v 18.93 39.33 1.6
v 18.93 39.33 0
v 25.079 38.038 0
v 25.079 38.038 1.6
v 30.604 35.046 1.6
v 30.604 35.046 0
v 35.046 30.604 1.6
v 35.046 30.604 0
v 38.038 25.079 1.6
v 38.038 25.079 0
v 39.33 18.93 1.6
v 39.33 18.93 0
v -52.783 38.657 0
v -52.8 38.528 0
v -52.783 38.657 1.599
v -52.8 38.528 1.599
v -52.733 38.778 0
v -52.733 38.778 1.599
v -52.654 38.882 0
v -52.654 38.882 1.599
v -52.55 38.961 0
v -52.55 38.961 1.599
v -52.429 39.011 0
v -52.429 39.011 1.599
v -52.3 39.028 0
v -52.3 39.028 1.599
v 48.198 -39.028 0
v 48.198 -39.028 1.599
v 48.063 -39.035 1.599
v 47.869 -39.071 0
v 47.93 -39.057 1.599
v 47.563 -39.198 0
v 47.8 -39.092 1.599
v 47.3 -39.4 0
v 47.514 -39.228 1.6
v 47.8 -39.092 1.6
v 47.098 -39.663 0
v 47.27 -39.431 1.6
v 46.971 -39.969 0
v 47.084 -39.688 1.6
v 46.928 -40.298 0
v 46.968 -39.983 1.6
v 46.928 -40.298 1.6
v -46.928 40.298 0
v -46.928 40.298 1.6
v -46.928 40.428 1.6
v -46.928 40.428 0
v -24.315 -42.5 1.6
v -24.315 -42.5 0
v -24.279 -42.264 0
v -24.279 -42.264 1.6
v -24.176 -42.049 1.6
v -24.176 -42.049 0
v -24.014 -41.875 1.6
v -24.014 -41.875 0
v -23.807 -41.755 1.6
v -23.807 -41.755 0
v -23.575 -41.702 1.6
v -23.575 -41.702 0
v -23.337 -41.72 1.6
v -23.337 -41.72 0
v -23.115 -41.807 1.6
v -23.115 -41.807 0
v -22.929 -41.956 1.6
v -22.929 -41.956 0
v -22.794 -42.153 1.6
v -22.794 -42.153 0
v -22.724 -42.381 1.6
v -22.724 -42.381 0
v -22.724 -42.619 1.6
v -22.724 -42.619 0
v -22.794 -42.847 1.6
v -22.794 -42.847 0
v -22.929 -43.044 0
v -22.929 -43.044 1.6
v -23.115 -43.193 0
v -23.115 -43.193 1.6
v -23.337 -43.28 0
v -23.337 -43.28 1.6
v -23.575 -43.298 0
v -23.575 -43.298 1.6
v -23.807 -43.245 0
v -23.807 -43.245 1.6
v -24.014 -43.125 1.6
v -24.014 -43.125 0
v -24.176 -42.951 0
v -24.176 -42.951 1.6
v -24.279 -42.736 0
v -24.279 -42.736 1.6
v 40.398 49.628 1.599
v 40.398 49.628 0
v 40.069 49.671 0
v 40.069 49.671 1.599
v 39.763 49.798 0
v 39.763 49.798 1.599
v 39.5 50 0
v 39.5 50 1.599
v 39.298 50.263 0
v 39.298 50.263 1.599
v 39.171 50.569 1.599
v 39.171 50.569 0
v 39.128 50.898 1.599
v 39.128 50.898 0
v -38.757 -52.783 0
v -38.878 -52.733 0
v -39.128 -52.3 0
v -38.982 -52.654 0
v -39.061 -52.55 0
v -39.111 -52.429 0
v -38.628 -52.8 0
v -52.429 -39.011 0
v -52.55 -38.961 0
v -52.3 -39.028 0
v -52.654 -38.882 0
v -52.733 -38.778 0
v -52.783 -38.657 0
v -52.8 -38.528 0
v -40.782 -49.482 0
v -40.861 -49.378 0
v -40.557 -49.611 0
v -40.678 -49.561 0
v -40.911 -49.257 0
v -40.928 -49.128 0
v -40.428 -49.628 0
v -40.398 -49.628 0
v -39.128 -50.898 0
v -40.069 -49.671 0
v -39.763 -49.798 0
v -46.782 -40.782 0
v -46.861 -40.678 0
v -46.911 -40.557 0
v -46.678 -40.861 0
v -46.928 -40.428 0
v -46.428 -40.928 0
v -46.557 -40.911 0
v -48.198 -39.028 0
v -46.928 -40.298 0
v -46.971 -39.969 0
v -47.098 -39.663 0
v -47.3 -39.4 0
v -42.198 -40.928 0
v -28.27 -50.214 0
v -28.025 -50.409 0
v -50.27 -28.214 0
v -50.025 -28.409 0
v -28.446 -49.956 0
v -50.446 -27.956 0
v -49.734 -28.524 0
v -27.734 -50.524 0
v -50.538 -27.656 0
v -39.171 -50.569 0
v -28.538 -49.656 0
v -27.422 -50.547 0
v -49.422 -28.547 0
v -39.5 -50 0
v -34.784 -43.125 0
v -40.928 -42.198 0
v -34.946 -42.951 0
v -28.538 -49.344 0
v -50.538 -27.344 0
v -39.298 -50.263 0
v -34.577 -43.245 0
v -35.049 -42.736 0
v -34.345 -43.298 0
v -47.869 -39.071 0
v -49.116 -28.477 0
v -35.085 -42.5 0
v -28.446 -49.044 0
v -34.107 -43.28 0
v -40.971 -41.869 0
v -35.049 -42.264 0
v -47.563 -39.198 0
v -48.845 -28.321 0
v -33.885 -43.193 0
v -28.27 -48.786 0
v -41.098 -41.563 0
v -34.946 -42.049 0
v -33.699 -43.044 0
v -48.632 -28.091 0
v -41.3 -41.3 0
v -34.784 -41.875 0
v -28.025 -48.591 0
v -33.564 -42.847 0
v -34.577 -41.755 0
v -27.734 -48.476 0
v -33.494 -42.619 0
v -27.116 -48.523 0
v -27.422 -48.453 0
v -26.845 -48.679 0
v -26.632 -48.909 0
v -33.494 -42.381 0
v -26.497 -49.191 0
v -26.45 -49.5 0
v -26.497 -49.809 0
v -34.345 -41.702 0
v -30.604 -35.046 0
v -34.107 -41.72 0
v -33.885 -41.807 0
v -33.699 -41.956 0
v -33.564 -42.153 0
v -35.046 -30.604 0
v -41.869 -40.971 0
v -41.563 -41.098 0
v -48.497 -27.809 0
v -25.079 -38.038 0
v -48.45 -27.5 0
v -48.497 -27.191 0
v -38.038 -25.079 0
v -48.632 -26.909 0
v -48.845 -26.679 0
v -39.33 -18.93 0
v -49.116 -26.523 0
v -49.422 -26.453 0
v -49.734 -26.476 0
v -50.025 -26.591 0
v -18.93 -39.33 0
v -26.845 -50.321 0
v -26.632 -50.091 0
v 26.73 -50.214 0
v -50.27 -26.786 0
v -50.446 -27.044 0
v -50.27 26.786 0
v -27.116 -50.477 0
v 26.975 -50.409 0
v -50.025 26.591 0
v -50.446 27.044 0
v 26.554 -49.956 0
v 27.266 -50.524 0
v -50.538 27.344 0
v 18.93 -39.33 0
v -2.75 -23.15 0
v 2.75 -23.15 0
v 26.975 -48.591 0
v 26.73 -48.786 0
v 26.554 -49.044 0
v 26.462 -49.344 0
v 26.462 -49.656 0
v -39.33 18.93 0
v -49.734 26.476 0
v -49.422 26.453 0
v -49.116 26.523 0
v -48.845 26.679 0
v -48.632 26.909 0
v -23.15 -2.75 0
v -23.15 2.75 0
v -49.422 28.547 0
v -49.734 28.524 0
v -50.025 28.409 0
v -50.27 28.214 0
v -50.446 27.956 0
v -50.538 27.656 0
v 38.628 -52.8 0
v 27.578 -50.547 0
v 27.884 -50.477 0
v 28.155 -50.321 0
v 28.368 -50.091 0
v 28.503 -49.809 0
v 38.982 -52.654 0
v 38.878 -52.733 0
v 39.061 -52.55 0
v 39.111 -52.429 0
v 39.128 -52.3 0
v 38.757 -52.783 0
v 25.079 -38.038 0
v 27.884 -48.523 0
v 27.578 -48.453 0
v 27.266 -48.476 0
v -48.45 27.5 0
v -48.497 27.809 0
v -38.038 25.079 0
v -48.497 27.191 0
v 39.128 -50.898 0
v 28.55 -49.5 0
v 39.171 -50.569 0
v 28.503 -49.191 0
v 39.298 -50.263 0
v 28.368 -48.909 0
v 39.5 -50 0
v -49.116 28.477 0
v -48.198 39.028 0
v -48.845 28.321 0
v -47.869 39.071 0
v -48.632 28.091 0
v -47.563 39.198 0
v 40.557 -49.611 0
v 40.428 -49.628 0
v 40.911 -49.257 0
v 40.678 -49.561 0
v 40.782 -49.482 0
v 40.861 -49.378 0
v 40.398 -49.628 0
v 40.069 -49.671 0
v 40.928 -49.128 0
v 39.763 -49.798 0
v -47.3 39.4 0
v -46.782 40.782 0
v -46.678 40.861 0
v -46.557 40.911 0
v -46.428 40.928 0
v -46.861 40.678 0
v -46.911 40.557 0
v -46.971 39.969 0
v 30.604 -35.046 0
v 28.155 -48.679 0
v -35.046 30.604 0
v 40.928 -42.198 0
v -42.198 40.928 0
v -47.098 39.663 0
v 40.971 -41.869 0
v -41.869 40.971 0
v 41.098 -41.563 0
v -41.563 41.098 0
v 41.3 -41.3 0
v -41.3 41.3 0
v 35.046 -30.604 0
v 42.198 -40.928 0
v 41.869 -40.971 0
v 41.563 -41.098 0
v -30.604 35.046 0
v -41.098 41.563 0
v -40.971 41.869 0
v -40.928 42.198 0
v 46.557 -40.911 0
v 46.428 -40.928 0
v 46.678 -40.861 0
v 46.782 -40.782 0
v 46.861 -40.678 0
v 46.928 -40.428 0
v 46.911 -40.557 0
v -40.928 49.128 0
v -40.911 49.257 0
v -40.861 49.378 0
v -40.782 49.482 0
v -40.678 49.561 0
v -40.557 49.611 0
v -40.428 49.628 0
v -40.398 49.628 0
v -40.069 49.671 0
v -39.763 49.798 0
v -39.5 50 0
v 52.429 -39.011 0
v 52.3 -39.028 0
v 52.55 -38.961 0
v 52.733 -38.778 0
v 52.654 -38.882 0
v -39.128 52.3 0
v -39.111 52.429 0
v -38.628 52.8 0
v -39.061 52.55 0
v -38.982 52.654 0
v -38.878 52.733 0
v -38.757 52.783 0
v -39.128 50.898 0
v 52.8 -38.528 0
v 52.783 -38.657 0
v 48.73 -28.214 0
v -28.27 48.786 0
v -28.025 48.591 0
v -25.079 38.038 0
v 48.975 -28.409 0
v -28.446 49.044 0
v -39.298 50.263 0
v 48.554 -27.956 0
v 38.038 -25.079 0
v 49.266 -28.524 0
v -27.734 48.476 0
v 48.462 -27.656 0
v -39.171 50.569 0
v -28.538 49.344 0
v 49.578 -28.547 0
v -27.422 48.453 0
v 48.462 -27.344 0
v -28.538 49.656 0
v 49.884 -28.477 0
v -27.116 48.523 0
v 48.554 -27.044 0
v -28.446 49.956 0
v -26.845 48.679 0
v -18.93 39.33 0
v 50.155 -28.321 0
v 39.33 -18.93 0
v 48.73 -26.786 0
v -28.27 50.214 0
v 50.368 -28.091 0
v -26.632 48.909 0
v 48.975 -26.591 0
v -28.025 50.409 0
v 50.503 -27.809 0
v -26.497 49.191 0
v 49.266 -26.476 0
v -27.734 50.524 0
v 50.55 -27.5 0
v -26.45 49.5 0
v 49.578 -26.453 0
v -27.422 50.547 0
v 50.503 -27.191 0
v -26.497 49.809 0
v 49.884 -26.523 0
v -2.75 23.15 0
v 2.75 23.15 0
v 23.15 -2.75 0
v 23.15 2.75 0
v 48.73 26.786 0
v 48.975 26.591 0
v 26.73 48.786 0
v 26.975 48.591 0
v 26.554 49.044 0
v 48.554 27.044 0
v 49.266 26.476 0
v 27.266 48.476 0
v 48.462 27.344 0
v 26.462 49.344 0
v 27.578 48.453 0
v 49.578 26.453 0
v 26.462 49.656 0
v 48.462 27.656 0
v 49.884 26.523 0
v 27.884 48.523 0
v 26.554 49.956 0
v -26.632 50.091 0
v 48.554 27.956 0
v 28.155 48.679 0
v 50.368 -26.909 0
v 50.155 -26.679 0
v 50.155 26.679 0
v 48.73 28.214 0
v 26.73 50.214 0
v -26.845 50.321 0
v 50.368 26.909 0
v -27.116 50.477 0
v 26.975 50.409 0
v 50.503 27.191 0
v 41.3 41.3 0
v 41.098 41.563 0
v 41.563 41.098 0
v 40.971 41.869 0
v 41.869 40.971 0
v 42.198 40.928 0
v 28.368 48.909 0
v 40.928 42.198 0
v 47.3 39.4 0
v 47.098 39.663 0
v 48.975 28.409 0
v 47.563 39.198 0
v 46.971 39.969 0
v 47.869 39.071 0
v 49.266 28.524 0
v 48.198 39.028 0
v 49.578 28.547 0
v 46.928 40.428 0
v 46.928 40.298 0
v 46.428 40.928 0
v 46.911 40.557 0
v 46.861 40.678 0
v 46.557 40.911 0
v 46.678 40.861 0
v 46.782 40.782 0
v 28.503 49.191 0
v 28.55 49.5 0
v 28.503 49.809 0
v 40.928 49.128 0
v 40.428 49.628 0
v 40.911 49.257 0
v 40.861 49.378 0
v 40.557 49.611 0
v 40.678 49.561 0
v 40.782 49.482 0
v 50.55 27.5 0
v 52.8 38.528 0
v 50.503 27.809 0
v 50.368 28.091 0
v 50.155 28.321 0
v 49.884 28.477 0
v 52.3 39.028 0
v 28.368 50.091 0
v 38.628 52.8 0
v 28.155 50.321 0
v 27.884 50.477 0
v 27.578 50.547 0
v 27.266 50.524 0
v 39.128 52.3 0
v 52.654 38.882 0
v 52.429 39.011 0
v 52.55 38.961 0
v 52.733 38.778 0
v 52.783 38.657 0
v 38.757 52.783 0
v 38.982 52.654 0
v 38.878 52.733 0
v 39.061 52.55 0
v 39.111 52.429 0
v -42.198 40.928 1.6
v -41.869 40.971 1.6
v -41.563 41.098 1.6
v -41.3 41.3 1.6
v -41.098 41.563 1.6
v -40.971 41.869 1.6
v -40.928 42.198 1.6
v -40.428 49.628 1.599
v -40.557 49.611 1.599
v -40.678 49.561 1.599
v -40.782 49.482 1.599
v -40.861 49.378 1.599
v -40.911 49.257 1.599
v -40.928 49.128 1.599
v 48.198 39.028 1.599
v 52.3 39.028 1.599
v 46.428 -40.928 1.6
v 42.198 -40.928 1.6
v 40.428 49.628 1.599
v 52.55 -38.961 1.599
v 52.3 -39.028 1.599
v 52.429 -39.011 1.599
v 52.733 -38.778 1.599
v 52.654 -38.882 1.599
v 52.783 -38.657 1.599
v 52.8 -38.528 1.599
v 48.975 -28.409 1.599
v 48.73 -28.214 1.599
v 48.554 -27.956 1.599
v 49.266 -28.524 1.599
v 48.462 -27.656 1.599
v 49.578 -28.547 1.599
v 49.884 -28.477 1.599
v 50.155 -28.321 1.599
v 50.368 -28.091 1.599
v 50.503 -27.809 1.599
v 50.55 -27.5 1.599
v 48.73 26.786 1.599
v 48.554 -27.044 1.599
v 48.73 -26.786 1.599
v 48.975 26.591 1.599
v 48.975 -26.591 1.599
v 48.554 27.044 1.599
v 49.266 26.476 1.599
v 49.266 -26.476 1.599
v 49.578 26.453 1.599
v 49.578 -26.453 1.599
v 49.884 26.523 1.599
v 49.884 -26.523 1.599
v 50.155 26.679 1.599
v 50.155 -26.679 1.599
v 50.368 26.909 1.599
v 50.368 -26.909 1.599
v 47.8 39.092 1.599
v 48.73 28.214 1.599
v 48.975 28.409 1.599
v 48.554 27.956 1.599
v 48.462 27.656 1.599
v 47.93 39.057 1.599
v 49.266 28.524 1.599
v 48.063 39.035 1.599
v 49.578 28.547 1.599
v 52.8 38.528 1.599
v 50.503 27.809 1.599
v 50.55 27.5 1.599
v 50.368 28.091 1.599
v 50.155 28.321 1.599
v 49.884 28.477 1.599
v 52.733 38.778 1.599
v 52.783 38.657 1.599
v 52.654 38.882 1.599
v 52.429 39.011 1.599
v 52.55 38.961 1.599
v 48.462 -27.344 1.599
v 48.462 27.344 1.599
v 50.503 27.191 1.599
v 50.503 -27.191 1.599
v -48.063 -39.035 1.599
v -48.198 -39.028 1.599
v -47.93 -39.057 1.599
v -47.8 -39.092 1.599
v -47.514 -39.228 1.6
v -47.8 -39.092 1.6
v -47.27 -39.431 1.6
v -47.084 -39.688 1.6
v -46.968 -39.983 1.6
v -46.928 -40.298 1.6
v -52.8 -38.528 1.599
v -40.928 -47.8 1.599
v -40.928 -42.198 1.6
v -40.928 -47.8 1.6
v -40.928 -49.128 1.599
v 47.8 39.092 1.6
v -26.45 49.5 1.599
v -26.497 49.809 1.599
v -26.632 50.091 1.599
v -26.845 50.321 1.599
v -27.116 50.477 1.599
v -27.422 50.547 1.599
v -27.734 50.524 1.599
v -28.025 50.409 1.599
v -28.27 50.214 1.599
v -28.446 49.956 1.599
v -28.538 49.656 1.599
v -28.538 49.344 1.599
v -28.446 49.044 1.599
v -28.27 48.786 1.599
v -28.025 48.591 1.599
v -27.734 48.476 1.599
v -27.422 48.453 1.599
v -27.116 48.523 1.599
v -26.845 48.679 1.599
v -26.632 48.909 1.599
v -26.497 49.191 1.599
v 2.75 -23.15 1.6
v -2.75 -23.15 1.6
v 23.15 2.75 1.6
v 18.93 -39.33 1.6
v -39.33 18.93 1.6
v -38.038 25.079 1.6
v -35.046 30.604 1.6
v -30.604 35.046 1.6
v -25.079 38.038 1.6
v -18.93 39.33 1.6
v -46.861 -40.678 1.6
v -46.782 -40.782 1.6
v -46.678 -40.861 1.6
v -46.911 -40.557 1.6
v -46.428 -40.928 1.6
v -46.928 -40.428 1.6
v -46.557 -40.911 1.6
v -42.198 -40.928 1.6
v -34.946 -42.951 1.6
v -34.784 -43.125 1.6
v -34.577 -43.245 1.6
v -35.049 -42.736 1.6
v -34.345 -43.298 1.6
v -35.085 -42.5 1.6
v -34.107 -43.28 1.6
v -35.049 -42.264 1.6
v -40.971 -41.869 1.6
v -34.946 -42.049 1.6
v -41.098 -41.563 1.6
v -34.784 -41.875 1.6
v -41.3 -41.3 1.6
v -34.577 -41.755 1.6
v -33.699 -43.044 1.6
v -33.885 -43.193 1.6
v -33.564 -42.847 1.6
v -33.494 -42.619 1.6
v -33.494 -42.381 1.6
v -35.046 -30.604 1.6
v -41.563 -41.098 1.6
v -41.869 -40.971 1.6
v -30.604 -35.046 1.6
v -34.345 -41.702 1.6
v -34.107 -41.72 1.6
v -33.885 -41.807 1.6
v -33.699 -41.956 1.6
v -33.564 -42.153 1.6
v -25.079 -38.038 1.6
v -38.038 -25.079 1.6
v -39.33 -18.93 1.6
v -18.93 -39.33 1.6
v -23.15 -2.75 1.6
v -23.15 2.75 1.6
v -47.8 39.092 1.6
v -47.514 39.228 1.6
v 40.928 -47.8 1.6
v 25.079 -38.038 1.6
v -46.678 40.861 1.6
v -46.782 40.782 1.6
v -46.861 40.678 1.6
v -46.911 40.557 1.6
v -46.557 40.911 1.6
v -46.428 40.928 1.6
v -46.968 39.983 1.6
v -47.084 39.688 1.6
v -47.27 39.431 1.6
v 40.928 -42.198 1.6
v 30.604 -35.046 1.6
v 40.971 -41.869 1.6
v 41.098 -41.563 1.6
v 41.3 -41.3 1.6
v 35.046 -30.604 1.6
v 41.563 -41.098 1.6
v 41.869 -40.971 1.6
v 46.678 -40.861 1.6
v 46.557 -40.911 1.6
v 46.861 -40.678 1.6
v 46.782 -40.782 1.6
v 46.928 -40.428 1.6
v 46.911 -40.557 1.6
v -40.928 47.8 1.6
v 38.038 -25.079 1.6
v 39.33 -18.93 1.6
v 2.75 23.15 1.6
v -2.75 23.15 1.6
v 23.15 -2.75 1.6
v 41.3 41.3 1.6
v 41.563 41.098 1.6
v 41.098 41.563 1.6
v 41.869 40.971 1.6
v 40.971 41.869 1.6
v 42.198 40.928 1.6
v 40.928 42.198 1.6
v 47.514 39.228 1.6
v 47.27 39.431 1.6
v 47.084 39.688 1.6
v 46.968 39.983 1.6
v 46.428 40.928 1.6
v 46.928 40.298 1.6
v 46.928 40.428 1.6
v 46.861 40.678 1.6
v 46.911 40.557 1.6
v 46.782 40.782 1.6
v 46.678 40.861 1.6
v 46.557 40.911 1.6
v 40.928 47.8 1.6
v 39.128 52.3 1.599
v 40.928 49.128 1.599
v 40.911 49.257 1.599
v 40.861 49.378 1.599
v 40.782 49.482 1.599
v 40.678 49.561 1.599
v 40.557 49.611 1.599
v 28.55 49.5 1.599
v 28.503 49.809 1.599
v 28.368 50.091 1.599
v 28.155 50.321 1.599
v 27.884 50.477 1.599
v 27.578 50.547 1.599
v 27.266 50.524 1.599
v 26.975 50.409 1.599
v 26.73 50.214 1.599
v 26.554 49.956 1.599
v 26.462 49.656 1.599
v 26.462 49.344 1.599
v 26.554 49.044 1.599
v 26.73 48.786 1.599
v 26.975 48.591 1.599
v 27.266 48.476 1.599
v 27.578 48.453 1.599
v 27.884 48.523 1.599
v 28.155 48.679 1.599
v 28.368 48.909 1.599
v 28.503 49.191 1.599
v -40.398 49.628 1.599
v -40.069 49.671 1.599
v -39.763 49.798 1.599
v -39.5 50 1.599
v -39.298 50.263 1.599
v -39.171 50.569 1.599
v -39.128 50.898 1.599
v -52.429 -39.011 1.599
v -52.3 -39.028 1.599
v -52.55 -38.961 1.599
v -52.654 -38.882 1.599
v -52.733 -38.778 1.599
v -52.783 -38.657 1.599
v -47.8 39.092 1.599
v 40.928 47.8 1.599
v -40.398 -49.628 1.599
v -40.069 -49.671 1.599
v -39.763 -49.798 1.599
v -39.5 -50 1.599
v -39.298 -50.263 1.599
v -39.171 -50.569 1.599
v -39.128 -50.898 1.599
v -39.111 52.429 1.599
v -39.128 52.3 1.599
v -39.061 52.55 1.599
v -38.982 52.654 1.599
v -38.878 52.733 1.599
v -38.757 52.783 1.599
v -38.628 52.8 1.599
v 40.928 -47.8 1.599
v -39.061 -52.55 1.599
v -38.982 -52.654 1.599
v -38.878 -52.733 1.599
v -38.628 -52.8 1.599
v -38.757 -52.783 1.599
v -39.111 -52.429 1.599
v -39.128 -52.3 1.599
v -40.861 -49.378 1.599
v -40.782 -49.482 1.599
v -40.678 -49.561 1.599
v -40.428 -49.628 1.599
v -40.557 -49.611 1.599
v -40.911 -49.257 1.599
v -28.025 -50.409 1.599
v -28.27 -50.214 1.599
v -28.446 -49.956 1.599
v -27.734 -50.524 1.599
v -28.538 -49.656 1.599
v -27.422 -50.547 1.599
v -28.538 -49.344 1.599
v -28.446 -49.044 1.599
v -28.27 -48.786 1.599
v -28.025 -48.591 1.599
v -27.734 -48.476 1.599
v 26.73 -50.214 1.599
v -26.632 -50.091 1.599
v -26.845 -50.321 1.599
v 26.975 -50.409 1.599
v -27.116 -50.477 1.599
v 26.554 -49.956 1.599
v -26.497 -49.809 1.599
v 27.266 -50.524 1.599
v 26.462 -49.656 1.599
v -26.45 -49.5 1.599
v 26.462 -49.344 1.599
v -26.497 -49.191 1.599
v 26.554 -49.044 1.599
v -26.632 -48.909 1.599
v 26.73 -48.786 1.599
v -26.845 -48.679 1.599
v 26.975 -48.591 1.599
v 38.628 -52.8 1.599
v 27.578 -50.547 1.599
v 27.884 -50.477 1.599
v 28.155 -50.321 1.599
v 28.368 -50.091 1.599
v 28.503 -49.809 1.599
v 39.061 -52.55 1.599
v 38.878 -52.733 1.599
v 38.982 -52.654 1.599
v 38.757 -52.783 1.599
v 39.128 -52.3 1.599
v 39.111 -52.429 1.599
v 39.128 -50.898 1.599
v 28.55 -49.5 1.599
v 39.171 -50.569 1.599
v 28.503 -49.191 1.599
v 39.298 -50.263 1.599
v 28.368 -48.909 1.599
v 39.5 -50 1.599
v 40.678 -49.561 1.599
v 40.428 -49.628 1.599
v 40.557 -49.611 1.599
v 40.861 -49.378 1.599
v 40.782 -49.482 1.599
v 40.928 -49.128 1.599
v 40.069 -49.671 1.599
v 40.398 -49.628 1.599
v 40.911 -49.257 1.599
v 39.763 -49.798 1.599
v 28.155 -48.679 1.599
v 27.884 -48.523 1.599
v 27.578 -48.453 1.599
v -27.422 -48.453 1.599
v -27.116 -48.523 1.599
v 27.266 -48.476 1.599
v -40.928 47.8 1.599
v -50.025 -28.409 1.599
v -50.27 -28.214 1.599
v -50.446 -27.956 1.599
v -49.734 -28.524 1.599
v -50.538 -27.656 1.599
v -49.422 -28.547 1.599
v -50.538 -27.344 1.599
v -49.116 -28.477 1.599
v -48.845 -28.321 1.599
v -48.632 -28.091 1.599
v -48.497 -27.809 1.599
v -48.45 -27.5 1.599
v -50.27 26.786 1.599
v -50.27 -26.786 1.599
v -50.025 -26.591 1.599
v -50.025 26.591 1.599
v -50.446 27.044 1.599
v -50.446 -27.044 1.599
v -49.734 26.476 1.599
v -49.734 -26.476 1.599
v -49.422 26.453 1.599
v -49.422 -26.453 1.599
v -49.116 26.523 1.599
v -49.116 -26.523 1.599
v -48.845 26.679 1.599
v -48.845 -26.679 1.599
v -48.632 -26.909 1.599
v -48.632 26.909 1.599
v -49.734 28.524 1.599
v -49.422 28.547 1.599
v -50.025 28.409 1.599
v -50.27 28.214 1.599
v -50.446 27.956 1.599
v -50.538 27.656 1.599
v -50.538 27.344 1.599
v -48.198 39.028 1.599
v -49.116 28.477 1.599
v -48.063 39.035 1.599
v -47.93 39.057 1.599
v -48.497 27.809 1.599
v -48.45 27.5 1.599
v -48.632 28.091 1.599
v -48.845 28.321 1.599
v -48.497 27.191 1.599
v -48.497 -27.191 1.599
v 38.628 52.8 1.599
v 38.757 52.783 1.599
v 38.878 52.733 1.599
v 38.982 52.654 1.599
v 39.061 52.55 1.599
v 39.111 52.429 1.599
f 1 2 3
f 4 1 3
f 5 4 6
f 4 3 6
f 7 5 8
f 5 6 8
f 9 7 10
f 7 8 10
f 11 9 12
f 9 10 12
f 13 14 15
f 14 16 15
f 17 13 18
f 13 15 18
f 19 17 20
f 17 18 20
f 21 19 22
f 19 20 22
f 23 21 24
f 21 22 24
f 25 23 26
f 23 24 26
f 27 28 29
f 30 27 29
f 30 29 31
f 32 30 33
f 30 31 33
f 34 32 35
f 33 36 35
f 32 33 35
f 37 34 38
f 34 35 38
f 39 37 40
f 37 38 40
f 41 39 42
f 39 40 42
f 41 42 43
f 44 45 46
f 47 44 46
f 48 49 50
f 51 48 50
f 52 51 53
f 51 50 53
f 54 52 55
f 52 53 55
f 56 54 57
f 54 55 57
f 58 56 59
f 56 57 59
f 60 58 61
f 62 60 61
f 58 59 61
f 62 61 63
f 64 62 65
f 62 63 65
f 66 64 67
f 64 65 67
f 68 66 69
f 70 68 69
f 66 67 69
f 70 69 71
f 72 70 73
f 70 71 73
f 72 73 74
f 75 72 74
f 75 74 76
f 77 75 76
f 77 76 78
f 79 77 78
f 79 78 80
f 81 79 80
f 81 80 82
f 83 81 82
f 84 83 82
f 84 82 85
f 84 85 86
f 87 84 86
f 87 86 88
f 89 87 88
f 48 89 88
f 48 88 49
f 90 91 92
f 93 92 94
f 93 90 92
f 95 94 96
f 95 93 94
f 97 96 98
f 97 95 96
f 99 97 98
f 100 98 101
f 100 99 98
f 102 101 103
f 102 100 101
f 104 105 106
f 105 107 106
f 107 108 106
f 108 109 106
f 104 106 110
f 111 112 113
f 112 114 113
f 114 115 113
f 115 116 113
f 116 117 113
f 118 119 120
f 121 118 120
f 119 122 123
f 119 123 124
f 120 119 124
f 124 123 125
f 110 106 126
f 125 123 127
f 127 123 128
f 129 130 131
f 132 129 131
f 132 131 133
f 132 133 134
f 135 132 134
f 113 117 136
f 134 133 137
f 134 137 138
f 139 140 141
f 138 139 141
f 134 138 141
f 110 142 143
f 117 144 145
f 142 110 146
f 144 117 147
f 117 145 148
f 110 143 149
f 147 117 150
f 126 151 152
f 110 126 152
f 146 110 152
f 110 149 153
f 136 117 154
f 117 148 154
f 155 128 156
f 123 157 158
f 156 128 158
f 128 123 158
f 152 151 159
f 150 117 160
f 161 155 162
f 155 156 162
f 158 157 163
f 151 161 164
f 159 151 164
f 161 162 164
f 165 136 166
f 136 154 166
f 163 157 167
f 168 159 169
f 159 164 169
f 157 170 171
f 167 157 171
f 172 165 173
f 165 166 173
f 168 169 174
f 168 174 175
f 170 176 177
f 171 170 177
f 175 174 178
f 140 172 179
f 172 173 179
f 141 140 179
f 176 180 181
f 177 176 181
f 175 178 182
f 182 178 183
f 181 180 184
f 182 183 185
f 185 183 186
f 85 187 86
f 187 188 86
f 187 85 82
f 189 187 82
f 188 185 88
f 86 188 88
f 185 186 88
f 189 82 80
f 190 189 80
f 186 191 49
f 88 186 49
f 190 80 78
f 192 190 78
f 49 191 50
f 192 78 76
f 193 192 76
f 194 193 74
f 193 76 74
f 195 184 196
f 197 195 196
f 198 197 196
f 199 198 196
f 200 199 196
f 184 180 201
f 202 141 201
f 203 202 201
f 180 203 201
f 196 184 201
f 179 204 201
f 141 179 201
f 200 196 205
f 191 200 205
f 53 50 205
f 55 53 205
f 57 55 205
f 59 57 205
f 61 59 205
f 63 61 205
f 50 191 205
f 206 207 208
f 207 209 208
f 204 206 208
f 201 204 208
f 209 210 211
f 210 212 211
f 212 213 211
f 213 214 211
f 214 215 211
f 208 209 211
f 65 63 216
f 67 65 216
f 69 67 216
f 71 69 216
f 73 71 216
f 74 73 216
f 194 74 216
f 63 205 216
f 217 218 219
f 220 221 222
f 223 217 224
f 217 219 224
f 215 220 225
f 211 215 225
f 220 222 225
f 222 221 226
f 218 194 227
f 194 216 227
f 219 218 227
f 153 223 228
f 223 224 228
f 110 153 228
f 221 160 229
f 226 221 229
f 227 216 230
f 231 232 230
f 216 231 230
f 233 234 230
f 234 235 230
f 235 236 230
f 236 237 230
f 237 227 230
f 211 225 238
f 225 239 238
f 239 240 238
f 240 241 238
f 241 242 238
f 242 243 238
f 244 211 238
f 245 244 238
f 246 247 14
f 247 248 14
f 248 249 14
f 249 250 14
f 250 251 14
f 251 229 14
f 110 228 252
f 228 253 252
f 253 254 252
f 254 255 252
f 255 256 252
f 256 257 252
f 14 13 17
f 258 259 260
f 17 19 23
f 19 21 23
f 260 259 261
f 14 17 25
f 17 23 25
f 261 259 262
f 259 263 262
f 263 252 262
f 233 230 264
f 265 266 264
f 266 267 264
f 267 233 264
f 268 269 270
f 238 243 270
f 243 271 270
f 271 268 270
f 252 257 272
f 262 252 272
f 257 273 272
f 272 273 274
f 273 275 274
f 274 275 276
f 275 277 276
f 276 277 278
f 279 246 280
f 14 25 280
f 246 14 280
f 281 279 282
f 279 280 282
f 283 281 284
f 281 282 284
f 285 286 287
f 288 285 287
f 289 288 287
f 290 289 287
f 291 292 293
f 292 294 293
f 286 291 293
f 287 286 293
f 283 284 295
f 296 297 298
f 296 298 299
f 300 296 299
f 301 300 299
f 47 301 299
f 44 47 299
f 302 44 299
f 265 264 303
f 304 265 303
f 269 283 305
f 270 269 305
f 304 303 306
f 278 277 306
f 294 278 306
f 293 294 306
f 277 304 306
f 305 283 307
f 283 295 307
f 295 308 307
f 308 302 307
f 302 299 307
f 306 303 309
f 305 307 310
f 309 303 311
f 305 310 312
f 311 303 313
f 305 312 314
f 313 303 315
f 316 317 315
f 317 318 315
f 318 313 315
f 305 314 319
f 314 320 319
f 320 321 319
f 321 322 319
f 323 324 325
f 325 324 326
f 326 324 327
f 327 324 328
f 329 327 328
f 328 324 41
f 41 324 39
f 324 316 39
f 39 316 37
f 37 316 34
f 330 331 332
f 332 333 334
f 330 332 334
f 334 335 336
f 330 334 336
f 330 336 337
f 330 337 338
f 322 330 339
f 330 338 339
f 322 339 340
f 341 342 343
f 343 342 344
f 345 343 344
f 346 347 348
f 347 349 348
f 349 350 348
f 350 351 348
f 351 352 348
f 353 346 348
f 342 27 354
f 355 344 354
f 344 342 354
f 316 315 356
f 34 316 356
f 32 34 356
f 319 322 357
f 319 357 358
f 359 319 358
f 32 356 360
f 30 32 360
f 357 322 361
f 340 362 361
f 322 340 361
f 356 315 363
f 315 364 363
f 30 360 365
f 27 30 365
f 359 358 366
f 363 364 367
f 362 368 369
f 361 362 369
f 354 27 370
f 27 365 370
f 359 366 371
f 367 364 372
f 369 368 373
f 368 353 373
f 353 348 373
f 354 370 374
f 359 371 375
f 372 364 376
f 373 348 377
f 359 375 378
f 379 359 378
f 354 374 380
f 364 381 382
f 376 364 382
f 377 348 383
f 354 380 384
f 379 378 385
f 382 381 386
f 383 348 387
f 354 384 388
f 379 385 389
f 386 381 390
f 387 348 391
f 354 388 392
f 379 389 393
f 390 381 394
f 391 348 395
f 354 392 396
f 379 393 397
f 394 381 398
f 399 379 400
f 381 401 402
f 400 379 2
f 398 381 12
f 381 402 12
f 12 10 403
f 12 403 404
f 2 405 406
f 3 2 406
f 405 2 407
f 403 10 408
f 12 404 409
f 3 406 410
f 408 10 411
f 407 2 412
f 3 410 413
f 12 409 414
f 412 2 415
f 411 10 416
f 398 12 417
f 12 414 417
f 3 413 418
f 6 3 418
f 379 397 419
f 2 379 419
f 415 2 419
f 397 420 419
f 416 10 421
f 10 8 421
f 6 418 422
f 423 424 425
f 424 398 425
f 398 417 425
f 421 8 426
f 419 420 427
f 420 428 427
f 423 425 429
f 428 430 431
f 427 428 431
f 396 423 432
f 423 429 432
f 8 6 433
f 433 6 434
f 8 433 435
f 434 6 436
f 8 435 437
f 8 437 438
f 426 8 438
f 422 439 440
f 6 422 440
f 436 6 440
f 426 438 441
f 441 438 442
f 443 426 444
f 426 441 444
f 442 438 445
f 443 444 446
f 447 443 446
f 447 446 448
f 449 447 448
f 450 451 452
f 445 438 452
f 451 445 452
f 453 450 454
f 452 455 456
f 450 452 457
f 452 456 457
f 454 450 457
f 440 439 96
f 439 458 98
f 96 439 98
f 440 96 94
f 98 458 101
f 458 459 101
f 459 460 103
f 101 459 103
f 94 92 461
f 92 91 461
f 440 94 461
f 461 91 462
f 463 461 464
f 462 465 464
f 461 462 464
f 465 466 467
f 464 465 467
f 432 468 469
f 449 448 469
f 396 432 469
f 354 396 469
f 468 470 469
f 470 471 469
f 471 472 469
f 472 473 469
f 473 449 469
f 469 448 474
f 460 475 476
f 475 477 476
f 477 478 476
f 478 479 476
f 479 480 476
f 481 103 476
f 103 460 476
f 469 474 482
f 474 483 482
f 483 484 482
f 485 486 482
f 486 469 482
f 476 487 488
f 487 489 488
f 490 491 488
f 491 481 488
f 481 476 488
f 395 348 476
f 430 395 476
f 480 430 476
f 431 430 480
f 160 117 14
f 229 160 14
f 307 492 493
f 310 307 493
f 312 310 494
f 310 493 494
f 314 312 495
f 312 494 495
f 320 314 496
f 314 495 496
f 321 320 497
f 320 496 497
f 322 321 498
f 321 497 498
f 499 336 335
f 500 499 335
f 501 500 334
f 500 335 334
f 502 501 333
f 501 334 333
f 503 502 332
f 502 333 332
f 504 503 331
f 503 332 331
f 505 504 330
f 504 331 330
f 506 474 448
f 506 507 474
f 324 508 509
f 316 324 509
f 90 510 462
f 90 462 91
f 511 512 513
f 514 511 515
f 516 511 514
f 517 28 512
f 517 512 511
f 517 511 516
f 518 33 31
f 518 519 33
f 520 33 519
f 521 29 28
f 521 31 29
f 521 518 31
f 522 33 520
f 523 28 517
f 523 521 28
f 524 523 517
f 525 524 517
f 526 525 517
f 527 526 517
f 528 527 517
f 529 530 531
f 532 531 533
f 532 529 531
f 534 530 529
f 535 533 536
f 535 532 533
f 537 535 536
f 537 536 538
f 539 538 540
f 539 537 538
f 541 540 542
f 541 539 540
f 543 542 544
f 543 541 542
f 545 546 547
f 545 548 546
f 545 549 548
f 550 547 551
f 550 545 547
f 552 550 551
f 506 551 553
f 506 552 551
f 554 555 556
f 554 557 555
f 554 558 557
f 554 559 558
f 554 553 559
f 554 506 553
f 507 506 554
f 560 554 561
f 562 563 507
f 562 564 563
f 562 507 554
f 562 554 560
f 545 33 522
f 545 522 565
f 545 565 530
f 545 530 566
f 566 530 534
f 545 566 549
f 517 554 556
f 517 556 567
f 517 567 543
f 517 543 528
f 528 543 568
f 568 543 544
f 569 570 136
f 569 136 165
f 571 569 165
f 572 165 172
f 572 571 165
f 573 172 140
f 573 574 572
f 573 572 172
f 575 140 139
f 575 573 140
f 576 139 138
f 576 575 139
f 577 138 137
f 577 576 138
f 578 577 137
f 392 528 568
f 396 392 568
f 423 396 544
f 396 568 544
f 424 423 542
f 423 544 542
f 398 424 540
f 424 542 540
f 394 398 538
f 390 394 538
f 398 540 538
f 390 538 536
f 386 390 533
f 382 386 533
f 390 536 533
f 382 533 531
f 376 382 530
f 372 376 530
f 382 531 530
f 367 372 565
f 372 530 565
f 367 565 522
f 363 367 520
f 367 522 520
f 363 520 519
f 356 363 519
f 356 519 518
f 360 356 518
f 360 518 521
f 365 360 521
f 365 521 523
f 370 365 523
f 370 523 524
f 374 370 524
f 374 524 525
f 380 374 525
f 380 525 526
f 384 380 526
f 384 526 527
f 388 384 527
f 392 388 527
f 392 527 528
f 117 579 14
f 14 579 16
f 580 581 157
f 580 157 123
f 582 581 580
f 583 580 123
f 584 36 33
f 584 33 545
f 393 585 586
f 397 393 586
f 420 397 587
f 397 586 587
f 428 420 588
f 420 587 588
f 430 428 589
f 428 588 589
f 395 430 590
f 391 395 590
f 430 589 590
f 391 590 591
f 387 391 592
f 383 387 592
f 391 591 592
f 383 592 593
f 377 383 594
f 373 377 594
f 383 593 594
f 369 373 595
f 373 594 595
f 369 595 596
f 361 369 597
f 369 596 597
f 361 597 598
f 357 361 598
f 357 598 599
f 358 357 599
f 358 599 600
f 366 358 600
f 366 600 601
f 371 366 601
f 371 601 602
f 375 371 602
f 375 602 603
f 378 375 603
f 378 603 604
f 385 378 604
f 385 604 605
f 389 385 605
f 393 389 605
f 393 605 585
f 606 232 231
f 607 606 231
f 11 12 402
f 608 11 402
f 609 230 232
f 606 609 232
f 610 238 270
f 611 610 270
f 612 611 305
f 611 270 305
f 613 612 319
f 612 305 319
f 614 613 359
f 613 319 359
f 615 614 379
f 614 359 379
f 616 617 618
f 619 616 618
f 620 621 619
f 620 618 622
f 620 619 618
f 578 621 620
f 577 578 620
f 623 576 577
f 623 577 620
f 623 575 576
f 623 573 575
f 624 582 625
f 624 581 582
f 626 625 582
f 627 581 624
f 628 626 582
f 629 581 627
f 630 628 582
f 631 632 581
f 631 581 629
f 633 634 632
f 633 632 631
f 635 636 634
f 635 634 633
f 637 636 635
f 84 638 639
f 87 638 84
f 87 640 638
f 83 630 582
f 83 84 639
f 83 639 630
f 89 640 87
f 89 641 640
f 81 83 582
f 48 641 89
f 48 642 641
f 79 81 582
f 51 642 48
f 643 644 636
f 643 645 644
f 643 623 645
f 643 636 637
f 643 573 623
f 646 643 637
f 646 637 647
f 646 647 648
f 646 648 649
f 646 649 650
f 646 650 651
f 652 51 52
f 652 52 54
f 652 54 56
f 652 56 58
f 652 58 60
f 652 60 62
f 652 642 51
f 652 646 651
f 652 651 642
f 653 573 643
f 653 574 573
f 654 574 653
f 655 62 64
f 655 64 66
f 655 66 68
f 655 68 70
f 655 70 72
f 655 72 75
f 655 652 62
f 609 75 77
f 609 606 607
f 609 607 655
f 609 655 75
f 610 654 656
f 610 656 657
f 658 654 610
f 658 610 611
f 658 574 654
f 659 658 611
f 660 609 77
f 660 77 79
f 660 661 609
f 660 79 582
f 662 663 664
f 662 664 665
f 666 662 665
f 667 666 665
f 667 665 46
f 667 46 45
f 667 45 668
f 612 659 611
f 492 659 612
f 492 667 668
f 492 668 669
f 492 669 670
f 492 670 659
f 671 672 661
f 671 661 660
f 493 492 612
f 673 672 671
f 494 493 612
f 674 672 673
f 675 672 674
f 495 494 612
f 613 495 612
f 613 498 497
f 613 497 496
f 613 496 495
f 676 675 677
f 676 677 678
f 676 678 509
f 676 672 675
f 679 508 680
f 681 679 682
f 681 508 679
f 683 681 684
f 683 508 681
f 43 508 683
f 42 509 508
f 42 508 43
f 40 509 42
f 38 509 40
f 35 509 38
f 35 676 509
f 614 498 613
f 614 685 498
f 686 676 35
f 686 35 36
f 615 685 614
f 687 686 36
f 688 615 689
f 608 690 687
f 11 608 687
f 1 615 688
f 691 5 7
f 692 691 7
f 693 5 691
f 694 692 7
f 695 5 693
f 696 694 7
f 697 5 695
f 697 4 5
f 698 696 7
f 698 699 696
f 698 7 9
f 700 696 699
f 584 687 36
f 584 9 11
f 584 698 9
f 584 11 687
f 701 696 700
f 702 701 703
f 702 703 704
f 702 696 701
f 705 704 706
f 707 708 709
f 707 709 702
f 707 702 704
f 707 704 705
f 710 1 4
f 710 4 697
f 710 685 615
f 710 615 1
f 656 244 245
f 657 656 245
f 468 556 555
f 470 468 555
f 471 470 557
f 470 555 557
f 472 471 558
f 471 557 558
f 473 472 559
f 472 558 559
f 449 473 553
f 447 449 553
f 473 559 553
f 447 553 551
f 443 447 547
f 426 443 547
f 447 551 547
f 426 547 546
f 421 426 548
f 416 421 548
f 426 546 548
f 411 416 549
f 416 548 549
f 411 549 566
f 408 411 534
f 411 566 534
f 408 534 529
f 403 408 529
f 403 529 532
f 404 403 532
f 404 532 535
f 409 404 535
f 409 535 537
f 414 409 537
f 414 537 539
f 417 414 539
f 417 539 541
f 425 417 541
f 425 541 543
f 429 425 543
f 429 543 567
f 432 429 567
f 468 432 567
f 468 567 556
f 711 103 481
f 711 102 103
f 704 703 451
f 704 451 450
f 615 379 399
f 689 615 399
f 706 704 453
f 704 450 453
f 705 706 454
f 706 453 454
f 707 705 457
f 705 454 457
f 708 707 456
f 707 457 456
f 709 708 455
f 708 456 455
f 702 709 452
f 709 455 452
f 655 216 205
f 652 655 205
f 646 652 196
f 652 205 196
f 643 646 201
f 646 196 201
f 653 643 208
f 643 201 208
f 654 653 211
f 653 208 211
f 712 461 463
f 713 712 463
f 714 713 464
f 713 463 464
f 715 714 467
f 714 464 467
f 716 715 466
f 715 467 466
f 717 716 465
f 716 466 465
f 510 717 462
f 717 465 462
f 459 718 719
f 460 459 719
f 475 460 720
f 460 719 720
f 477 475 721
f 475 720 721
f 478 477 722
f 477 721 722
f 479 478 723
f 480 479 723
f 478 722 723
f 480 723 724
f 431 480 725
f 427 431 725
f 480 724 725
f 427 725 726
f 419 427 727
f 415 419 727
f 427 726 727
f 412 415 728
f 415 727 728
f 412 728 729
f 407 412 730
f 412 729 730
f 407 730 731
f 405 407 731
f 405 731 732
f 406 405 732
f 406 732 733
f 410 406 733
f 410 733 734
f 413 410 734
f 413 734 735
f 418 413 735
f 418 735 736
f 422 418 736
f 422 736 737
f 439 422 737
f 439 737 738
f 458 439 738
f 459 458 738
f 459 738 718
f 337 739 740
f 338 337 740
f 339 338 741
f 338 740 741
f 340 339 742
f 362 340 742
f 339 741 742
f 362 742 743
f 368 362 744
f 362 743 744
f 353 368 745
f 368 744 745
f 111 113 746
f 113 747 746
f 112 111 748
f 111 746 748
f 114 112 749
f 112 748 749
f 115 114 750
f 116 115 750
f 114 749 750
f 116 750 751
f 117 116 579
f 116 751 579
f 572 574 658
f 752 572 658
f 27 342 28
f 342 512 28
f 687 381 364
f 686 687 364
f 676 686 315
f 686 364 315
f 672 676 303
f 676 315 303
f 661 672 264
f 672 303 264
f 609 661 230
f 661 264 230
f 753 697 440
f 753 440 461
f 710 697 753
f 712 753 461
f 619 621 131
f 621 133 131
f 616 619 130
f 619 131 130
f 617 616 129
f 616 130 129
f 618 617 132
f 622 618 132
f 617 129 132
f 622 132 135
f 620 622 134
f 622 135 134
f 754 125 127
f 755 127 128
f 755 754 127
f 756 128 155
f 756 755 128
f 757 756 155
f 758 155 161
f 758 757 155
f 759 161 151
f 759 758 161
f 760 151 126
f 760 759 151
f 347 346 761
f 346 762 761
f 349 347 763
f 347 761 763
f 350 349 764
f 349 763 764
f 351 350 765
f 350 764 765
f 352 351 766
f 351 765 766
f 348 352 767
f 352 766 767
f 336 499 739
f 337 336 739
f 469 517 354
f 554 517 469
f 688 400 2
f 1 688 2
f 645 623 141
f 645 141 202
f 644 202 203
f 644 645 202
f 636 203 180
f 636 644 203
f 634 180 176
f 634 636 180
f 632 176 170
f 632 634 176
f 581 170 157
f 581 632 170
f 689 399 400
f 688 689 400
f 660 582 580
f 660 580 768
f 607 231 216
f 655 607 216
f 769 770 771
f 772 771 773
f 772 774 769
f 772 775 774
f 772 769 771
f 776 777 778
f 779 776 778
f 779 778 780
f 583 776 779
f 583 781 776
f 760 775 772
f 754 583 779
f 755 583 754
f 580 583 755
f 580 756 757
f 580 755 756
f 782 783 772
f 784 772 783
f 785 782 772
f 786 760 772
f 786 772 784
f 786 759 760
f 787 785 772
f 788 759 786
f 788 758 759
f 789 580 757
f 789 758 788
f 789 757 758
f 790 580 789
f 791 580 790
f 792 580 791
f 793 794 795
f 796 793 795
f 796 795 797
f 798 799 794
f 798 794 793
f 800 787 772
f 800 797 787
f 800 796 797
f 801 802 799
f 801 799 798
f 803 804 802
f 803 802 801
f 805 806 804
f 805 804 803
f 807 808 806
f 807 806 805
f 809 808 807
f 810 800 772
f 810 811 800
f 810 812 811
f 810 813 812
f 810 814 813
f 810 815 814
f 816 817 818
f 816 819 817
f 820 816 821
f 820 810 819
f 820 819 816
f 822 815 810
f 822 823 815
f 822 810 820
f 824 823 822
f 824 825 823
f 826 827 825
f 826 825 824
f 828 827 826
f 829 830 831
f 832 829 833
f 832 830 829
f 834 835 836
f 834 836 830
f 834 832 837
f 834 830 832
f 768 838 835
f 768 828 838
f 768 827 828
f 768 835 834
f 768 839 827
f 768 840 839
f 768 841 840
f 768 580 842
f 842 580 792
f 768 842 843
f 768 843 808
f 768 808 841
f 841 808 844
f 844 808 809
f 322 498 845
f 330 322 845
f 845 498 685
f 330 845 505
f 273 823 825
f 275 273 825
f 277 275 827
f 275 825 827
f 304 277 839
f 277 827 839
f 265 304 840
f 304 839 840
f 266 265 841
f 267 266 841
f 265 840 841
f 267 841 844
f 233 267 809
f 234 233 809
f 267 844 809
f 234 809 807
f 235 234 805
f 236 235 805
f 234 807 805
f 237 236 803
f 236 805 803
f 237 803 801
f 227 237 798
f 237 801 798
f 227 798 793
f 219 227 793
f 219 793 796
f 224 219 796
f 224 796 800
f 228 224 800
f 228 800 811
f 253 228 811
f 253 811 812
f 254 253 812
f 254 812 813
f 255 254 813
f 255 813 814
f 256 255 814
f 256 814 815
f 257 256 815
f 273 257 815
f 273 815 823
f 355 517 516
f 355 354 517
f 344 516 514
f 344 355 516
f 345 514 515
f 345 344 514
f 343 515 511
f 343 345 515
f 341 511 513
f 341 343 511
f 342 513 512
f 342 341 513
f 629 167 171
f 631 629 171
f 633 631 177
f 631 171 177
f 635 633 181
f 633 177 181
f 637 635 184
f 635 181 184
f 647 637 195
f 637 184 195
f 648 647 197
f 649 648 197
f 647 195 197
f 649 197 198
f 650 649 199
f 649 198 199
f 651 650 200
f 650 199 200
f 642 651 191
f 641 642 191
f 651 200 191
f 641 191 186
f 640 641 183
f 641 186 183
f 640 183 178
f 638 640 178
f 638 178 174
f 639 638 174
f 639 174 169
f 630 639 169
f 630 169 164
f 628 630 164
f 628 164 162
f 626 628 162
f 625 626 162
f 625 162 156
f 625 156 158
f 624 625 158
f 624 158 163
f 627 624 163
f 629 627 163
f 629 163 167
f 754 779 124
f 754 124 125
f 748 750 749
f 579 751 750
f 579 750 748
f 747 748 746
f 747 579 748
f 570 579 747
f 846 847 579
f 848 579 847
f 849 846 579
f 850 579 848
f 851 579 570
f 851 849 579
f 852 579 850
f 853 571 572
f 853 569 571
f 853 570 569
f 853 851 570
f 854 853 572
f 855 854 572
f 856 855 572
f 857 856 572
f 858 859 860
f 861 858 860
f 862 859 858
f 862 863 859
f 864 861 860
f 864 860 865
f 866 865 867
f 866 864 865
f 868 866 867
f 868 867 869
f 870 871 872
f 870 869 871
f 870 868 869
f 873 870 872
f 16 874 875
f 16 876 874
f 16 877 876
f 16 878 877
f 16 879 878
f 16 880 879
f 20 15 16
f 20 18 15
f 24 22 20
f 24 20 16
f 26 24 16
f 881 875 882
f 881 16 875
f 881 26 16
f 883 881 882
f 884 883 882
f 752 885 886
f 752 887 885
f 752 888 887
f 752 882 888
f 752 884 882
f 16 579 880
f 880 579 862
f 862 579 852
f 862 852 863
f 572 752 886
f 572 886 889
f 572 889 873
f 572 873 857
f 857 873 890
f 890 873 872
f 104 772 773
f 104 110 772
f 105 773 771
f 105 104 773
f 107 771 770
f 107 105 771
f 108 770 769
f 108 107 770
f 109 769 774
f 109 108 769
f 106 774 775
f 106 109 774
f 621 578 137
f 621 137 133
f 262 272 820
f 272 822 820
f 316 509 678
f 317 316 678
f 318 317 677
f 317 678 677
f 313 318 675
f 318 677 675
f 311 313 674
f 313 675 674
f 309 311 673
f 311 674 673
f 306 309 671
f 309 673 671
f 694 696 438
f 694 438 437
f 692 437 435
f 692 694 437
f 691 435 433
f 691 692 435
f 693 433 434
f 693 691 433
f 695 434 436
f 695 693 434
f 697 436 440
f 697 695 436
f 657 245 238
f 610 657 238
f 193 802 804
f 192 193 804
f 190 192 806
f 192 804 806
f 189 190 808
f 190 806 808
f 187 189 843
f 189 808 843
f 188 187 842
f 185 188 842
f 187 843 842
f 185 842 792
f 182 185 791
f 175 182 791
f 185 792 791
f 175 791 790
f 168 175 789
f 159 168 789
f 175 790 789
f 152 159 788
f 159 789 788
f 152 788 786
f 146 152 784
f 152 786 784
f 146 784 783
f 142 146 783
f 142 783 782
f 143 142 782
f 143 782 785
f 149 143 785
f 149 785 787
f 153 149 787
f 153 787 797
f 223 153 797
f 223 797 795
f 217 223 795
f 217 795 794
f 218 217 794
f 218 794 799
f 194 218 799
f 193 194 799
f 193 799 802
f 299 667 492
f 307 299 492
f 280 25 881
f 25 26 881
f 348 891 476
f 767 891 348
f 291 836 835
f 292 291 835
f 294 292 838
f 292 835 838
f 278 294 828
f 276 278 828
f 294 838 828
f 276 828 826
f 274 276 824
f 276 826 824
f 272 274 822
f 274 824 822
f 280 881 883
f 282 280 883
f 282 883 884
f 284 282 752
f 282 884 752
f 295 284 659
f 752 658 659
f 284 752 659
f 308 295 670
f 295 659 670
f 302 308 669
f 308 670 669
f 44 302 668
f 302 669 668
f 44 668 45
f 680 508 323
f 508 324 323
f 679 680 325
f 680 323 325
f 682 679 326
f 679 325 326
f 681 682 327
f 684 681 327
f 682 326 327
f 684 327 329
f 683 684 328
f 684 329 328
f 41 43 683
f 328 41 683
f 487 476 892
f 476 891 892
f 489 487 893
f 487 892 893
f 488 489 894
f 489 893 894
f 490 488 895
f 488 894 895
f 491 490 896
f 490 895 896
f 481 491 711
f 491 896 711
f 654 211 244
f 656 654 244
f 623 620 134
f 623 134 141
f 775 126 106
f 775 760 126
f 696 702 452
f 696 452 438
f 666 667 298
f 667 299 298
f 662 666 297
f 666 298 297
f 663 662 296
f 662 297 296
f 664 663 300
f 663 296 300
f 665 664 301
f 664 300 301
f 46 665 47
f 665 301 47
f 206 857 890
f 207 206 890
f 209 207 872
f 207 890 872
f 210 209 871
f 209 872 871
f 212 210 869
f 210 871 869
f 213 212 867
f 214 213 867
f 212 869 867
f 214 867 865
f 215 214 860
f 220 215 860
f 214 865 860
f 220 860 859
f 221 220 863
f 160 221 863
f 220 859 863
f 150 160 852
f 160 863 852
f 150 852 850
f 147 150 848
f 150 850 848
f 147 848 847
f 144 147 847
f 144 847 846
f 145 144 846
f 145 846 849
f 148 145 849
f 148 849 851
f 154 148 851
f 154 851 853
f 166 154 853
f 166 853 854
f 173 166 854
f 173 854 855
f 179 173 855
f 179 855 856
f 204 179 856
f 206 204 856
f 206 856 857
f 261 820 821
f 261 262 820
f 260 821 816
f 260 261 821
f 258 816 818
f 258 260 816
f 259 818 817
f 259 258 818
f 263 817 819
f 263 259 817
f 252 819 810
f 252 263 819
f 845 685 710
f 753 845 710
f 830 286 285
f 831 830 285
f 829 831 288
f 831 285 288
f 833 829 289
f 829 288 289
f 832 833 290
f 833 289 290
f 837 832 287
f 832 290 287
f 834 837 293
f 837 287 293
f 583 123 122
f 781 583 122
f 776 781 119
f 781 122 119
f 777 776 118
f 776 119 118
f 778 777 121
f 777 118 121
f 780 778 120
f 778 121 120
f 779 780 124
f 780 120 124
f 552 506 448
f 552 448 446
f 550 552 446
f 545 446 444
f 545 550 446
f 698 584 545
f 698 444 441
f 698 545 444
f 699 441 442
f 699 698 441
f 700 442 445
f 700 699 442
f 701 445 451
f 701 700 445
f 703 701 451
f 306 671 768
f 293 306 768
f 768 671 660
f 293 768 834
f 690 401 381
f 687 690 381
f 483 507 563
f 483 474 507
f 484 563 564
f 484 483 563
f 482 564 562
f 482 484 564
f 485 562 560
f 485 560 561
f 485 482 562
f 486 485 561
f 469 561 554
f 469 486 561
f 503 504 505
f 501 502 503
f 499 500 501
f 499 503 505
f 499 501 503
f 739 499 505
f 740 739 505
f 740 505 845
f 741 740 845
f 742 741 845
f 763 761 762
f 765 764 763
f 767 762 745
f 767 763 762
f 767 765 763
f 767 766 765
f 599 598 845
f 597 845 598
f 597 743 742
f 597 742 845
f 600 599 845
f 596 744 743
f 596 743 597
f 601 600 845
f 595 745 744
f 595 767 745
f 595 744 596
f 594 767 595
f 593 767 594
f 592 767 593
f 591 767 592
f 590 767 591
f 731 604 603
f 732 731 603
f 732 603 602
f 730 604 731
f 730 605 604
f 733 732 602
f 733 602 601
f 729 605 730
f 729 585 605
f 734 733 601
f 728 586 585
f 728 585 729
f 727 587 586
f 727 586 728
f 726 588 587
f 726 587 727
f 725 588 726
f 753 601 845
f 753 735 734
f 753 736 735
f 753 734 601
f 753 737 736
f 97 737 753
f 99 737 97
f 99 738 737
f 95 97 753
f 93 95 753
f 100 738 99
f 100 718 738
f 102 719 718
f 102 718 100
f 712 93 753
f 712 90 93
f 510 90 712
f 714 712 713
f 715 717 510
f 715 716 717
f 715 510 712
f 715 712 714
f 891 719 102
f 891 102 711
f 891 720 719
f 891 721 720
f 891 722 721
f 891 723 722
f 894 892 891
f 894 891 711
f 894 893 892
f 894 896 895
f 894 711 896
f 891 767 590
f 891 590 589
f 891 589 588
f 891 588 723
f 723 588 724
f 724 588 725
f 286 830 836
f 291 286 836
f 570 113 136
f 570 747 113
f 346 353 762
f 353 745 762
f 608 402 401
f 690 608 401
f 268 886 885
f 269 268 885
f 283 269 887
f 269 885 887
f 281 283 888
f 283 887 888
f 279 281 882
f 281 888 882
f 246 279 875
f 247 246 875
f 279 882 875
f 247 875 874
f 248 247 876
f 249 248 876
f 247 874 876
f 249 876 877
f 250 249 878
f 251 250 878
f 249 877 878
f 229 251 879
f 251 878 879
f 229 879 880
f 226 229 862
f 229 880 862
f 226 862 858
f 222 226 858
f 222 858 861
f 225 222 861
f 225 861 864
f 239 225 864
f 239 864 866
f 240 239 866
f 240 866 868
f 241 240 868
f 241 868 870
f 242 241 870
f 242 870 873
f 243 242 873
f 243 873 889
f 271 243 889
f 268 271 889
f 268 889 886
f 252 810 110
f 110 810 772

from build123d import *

# Parameters (mm, degrees)
SKETCH1_W                    = 106
SKETCH1_H                    = 106
MAINOUTLINE_DEPTH            = 1.6
SKETCH4_W                    = 11.7
SKETCH4_H                    = 11.7
RAILCUTOUTS_DEPTH            = 75.970394157
SKETCH13_W                   = 5.7
SKETCH13_H                   = 1.9
SKETCH13_W_2                 = 1.8
SKETCH13_H_2                 = 3
FILLETCUTOUTS_DEPTH          = 75.970394157
SMOOTHCORNER_DEPTH           = 10
MIRROR2_COPY_1_SKETCH_W      = 11.7
MIRROR2_COPY_1_SKETCH_H      = 11.7
MIRROR2_COPY_1_DEPTH         = 75.970394157
MIRROR2_COPY_2_SKETCH_W      = 5.7
MIRROR2_COPY_2_SKETCH_H      = 1.9
MIRROR2_COPY_2_SKETCH_W_2    = 1.8
MIRROR2_COPY_2_SKETCH_H_2    = 3
MIRROR2_COPY_2_DEPTH         = 75.970394157
MIRROR2_COPY_3_DEPTH         = 10
MIRROR2_COPY_4_SKETCH_W      = 11.7
MIRROR2_COPY_4_SKETCH_H      = 11.7
MIRROR2_COPY_4_DEPTH         = 75.970394157
MIRROR2_COPY_5_SKETCH_W      = 5.7
MIRROR2_COPY_5_SKETCH_H      = 1.9
MIRROR2_COPY_5_SKETCH_W_2    = 1.8
MIRROR2_COPY_5_SKETCH_H_2    = 3
MIRROR2_COPY_5_DEPTH         = 75.970394157
FILLET10_R                   = 0.5
M2_CLEARANCE_HOLE1_D         = 2.1
SKETCH16_W                   = 90
SKETCH16_H                   = 5.2
SKETCH16_W_2                 = 5.2
SKETCH16_H_2                 = 90
CUT_EXTRUDE6_DEPTH           = 0.001
CUT_EXTRUDE8_DEPTH           = 10
SKETCH29_R                   = 0.8
CONNECTOR_LOCATION_DEPTH     = 10
CUT_EXTRUDE_THIN1_DEPTH      = 75.970394157
CUT_EXTRUDE_THIN1_DEPTH_BACK = 75.970394157
SKETCH31_W                   = 125.6
SKETCH31_H                   = 125.6
SKETCH31_W_2                 = 105.6
SKETCH31_H_2                 = 105.6
FILLET12_R                   = 0.5


with BuildPart() as part:
    # Sketch1 → mainOutline (new body)
    with BuildSketch(Plane.XY):
        Rectangle(SKETCH1_W, SKETCH1_H)
    extrude(amount=MAINOUTLINE_DEPTH)

    # Sketch4 → railCutouts (cut, through all)
    with BuildSketch(Plane(origin=(0, 0, 0), x_dir=(-1, 0, 0), z_dir=(0, 0, -1))):
        with Locations((47.15, 47.15)):
            Rectangle(SKETCH4_W, SKETCH4_H)
    railcutouts = extrude(amount=-RAILCUTOUTS_DEPTH, mode=Mode.SUBTRACT)

    # Sketch13 → filletCutouts (cut, symmetric)
    with BuildSketch(Plane(origin=(0, 0, 0), x_dir=(-1, 0, 0), z_dir=(0, 0, -1))):
        with Locations((50.15, 40.35)):
            Rectangle(SKETCH13_W, SKETCH13_H)
        with Locations((40.4, 51.5)):
            Rectangle(SKETCH13_W_2, SKETCH13_H_2)
    filletcutouts = extrude(amount=FILLETCUTOUTS_DEPTH, both=True, mode=Mode.SUBTRACT)

    # Sketch27 → smoothCorner (cut)
    with BuildSketch(Plane.XY.offset(1.6)):
        with BuildLine():
            Line((-40.928025612, 42.198025612), (-40.928025612, 49.628025612))
            Line((-40.928025612, 49.628025612), (-40.398025612, 49.628025612))
            ThreePointArc((-40.398025612, 49.628025612), (-39.5, 50), (-39.128025612, 50.898025612))
            Line((-39.128025612, 50.898025612), (-39.128025612, 53))
            Line((-39.128025612, 53), (-53, 53))
            Line((-53, 53), (-53, 39.028025612))
            Line((-53, 39.028025612), (-48.198025612, 39.028025612))
            ThreePointArc((-48.198025612, 39.028025612), (-47.3, 39.4), (-46.928025612, 40.298025612))
            Line((-46.928025612, 40.298025612), (-46.928025612, 40.928025612))
            Line((-46.928025612, 40.928025612), (-42.198025612, 40.928025612))
            ThreePointArc((-42.198025612, 40.928025612), (-41.3, 41.3), (-40.928025612, 42.198025612))
        make_face()
    smoothcorner = extrude(amount=-SMOOTHCORNER_DEPTH, mode=Mode.SUBTRACT)

    # Mirror1: railCutouts, filletCutouts, smoothCorner across plane
    add(railcutouts.mirror(Plane(origin=(0, 0, 0), x_dir=(0, 0, 1), z_dir=(1, 0, 0))), mode=Mode.SUBTRACT)
    add(filletcutouts.mirror(Plane(origin=(0, 0, 0), x_dir=(0, 0, 1), z_dir=(1, 0, 0))), mode=Mode.SUBTRACT)
    add(smoothcorner.mirror(Plane(origin=(0, 0, 0), x_dir=(0, 0, 1), z_dir=(1, 0, 0))), mode=Mode.SUBTRACT)

    # Mirror2: smoothCorner across plane
    add(smoothcorner.mirror(Plane.ZX), mode=Mode.SUBTRACT)

    # Mirror2 copy 1 sketch → Mirror2 copy 1 (cut, through all)
    with BuildSketch(Plane(origin=(0, 0, 0), x_dir=(1, 0, 0), z_dir=(0, 0, -1))):
        with Locations((47.15, 47.15)):
            Rectangle(MIRROR2_COPY_1_SKETCH_W, MIRROR2_COPY_1_SKETCH_H)
    extrude(amount=-MIRROR2_COPY_1_DEPTH, mode=Mode.SUBTRACT)

    # Mirror2 copy 2 sketch → Mirror2 copy 2 (cut, symmetric)
    with BuildSketch(Plane(origin=(0, 0, 0), x_dir=(1, 0, 0), z_dir=(0, 0, -1))):
        with Locations((50.15, 40.35)):
            Rectangle(MIRROR2_COPY_2_SKETCH_W, MIRROR2_COPY_2_SKETCH_H)
        with Locations((40.4, 51.5)):
            Rectangle(MIRROR2_COPY_2_SKETCH_W_2, MIRROR2_COPY_2_SKETCH_H_2)
    extrude(amount=MIRROR2_COPY_2_DEPTH, both=True, mode=Mode.SUBTRACT)

    # Mirror2 copy 3 sketch → Mirror2 copy 3 (cut)
    with BuildSketch(Plane(origin=(0, 0, 1.6), x_dir=(-1, 0, 0), z_dir=(0, 0, 1))):
        with BuildLine():
            Line((-40.928025612, 42.198025612), (-40.928025612, 49.628025612))
            Line((-40.928025612, 49.628025612), (-40.398025612, 49.628025612))
            ThreePointArc((-40.398025612, 49.628025612), (-39.5, 50), (-39.128025612, 50.898025612))
            Line((-39.128025612, 50.898025612), (-39.128025612, 53))
            Line((-39.128025612, 53), (-53, 53))
            Line((-53, 53), (-53, 39.028025612))
            Line((-53, 39.028025612), (-48.198025612, 39.028025612))
            ThreePointArc((-48.198025612, 39.028025612), (-47.3, 39.4), (-46.928025612, 40.298025612))
            Line((-46.928025612, 40.298025612), (-46.928025612, 40.928025612))
            Line((-46.928025612, 40.928025612), (-42.198025612, 40.928025612))
            ThreePointArc((-42.198025612, 40.928025612), (-41.3, 41.3), (-40.928025612, 42.198025612))
        make_face()
    extrude(amount=-MIRROR2_COPY_3_DEPTH, mode=Mode.SUBTRACT)

    # Mirror2 copy 4 sketch → Mirror2 copy 4 (cut, through all)
    with BuildSketch(Plane(origin=(0, 0, 0), x_dir=(-1, 0, 0), z_dir=(0, 0, -1))):
        with Locations((47.15, -47.15)):
            Rectangle(MIRROR2_COPY_4_SKETCH_W, MIRROR2_COPY_4_SKETCH_H)
    extrude(amount=-MIRROR2_COPY_4_DEPTH, mode=Mode.SUBTRACT)

    # Mirror2 copy 5 sketch → Mirror2 copy 5 (cut, symmetric)
    with BuildSketch(Plane(origin=(0, 0, 0), x_dir=(-1, 0, 0), z_dir=(0, 0, -1))):
        with Locations((50.15, -40.35)):
            Rectangle(MIRROR2_COPY_5_SKETCH_W, MIRROR2_COPY_5_SKETCH_H)
        with Locations((40.4, -51.5)):
            Rectangle(MIRROR2_COPY_5_SKETCH_W_2, MIRROR2_COPY_5_SKETCH_H_2)
    extrude(amount=MIRROR2_COPY_5_DEPTH, both=True, mode=Mode.SUBTRACT)

    # Fillet10
    fillet10_edges = [part.edges().sort_by_distance(p)[0] for p in [
        (40.928025612, 49.628025612, 0.8),
        (46.928025612, 40.928025612, 0.8),
        (46.928025612, -40.928025612, 0.8),
        (40.928025612, -49.628025612, 0.8),
        (-40.928025612, -49.628025612, 0.8),
        (-46.928025612, -40.928025612, 0.8),
        (-46.928025612, 40.928025612, 0.8),
        (-40.928025612, 49.628025612, 0.8),
    ]]
    fillet(fillet10_edges, radius=FILLET10_R)

    # M2 Clearance Hole1 (through all)
    with Locations(Plane(origin=(0, 0, 0), x_dir=(-1, 0, 0), z_dir=(0, 0, -1))):
        with Locations((49.5, -27.5), (27.5, -49.5), (-49.5, -27.5), (-27.5, -49.5), (-27.5, 49.5), (-49.5, 27.5), (27.5, 49.5), (49.5, 27.5)):
            Hole(M2_CLEARANCE_HOLE1_D / 2)

    # Sketch16 → Cut-Extrude6 (cut)
    with BuildSketch(Plane.XY.offset(1.6)):
        with Locations((0, -50.4)):
            Rectangle(SKETCH16_W, SKETCH16_H)
        with Locations((0, 50.4)):
            Rectangle(SKETCH16_W, SKETCH16_H)
        with Locations((-50.4, 0)):
            Rectangle(SKETCH16_W_2, SKETCH16_H_2)
        with Locations((50.4, 0)):
            Rectangle(SKETCH16_W_2, SKETCH16_H_2)
    extrude(amount=-CUT_EXTRUDE6_DEPTH, mode=Mode.SUBTRACT)

    # Sketch30 → Cut-Extrude8 (cut)
    with BuildSketch(Plane(origin=(0, 0, 0), x_dir=(-1, 0, 0), z_dir=(0, 0, -1))):
        with BuildLine():
            Line((-18.930017367, -39.330048004), (-2.75, -23.150030637))
            Line((-2.75, -23.150030637), (2.75, -23.150030637))
            Line((2.75, -23.150030637), (18.930017367, -39.330048004))
            ThreePointArc((18.930017367, -39.330048004), (32.985735805, -32.985735805), (39.330048004, -18.930017367))
            Line((39.330048004, -18.930017367), (23.150030637, -2.75))
            Line((23.150030637, -2.75), (23.150030637, 2.75))
            Line((23.150030637, 2.75), (39.330048004, 18.930017367))
            ThreePointArc((39.330048004, 18.930017367), (32.985735805, 32.985735805), (18.930017367, 39.330048004))
            Line((18.930017367, 39.330048004), (2.75, 23.150030637))
            Line((2.75, 23.150030637), (-2.75, 23.150030637))
            Line((-2.75, 23.150030637), (-18.930017367, 39.330048004))
            ThreePointArc((-18.930017367, 39.330048004), (-32.985735805, 32.985735805), (-39.330048004, 18.930017367))
            Line((-39.330048004, 18.930017367), (-23.150030637, 2.75))
            Line((-23.150030637, 2.75), (-23.150030637, -2.75))
            Line((-23.150030637, -2.75), (-39.330048004, -18.930017367))
            ThreePointArc((-39.330048004, -18.930017367), (-32.985735805, -32.985735805), (-18.930017367, -39.330048004))
        make_face()
    extrude(amount=-CUT_EXTRUDE8_DEPTH, mode=Mode.SUBTRACT)

    # Sketch29 → Connector Location (cut)
    with BuildSketch(Plane(origin=(0, 0, 0), x_dir=(-1, 0, 0), z_dir=(0, 0, -1))):
        with Locations((34.285, -42.5)):
            Circle(SKETCH29_R)
        with Locations((23.515, -42.5)):
            Circle(SKETCH29_R)
    extrude(amount=-CONNECTOR_LOCATION_DEPTH, mode=Mode.SUBTRACT)

    # Sketch31 → Cut-Extrude-Thin1 (cut, two sides: drawn at the far end of the back side and taken through both)
    with BuildSketch(Plane(origin=(0, 0, 0), x_dir=(-1, 0, 0), z_dir=(0, 0, -1)).offset(-CUT_EXTRUDE_THIN1_DEPTH_BACK)):
        Rectangle(SKETCH31_W, SKETCH31_H)
        Rectangle(SKETCH31_W_2, SKETCH31_H_2, mode=Mode.SUBTRACT)
    extrude(amount=CUT_EXTRUDE_THIN1_DEPTH + CUT_EXTRUDE_THIN1_DEPTH_BACK, mode=Mode.SUBTRACT)

    # Fillet12
    fillet12_edges = [part.edges().sort_by_distance(p)[0] for p in [
        (-52.8, 39.028025612, 0.7995),
        (39.128025612, -52.8, 0.7995),
        (52.8, -39.028025612, 0.7995),
        (-39.128025612, 52.8, 0.7995),
        (-52.8, -39.028025612, 0.7995),
        (-39.128025612, -52.8, 0.7995),
        (52.8, 39.028025612, 0.7995),
        (39.128025612, 52.8, 0.7995),
    ]]
    fillet(fillet12_edges, radius=FILLET12_R)


solid = part.part
